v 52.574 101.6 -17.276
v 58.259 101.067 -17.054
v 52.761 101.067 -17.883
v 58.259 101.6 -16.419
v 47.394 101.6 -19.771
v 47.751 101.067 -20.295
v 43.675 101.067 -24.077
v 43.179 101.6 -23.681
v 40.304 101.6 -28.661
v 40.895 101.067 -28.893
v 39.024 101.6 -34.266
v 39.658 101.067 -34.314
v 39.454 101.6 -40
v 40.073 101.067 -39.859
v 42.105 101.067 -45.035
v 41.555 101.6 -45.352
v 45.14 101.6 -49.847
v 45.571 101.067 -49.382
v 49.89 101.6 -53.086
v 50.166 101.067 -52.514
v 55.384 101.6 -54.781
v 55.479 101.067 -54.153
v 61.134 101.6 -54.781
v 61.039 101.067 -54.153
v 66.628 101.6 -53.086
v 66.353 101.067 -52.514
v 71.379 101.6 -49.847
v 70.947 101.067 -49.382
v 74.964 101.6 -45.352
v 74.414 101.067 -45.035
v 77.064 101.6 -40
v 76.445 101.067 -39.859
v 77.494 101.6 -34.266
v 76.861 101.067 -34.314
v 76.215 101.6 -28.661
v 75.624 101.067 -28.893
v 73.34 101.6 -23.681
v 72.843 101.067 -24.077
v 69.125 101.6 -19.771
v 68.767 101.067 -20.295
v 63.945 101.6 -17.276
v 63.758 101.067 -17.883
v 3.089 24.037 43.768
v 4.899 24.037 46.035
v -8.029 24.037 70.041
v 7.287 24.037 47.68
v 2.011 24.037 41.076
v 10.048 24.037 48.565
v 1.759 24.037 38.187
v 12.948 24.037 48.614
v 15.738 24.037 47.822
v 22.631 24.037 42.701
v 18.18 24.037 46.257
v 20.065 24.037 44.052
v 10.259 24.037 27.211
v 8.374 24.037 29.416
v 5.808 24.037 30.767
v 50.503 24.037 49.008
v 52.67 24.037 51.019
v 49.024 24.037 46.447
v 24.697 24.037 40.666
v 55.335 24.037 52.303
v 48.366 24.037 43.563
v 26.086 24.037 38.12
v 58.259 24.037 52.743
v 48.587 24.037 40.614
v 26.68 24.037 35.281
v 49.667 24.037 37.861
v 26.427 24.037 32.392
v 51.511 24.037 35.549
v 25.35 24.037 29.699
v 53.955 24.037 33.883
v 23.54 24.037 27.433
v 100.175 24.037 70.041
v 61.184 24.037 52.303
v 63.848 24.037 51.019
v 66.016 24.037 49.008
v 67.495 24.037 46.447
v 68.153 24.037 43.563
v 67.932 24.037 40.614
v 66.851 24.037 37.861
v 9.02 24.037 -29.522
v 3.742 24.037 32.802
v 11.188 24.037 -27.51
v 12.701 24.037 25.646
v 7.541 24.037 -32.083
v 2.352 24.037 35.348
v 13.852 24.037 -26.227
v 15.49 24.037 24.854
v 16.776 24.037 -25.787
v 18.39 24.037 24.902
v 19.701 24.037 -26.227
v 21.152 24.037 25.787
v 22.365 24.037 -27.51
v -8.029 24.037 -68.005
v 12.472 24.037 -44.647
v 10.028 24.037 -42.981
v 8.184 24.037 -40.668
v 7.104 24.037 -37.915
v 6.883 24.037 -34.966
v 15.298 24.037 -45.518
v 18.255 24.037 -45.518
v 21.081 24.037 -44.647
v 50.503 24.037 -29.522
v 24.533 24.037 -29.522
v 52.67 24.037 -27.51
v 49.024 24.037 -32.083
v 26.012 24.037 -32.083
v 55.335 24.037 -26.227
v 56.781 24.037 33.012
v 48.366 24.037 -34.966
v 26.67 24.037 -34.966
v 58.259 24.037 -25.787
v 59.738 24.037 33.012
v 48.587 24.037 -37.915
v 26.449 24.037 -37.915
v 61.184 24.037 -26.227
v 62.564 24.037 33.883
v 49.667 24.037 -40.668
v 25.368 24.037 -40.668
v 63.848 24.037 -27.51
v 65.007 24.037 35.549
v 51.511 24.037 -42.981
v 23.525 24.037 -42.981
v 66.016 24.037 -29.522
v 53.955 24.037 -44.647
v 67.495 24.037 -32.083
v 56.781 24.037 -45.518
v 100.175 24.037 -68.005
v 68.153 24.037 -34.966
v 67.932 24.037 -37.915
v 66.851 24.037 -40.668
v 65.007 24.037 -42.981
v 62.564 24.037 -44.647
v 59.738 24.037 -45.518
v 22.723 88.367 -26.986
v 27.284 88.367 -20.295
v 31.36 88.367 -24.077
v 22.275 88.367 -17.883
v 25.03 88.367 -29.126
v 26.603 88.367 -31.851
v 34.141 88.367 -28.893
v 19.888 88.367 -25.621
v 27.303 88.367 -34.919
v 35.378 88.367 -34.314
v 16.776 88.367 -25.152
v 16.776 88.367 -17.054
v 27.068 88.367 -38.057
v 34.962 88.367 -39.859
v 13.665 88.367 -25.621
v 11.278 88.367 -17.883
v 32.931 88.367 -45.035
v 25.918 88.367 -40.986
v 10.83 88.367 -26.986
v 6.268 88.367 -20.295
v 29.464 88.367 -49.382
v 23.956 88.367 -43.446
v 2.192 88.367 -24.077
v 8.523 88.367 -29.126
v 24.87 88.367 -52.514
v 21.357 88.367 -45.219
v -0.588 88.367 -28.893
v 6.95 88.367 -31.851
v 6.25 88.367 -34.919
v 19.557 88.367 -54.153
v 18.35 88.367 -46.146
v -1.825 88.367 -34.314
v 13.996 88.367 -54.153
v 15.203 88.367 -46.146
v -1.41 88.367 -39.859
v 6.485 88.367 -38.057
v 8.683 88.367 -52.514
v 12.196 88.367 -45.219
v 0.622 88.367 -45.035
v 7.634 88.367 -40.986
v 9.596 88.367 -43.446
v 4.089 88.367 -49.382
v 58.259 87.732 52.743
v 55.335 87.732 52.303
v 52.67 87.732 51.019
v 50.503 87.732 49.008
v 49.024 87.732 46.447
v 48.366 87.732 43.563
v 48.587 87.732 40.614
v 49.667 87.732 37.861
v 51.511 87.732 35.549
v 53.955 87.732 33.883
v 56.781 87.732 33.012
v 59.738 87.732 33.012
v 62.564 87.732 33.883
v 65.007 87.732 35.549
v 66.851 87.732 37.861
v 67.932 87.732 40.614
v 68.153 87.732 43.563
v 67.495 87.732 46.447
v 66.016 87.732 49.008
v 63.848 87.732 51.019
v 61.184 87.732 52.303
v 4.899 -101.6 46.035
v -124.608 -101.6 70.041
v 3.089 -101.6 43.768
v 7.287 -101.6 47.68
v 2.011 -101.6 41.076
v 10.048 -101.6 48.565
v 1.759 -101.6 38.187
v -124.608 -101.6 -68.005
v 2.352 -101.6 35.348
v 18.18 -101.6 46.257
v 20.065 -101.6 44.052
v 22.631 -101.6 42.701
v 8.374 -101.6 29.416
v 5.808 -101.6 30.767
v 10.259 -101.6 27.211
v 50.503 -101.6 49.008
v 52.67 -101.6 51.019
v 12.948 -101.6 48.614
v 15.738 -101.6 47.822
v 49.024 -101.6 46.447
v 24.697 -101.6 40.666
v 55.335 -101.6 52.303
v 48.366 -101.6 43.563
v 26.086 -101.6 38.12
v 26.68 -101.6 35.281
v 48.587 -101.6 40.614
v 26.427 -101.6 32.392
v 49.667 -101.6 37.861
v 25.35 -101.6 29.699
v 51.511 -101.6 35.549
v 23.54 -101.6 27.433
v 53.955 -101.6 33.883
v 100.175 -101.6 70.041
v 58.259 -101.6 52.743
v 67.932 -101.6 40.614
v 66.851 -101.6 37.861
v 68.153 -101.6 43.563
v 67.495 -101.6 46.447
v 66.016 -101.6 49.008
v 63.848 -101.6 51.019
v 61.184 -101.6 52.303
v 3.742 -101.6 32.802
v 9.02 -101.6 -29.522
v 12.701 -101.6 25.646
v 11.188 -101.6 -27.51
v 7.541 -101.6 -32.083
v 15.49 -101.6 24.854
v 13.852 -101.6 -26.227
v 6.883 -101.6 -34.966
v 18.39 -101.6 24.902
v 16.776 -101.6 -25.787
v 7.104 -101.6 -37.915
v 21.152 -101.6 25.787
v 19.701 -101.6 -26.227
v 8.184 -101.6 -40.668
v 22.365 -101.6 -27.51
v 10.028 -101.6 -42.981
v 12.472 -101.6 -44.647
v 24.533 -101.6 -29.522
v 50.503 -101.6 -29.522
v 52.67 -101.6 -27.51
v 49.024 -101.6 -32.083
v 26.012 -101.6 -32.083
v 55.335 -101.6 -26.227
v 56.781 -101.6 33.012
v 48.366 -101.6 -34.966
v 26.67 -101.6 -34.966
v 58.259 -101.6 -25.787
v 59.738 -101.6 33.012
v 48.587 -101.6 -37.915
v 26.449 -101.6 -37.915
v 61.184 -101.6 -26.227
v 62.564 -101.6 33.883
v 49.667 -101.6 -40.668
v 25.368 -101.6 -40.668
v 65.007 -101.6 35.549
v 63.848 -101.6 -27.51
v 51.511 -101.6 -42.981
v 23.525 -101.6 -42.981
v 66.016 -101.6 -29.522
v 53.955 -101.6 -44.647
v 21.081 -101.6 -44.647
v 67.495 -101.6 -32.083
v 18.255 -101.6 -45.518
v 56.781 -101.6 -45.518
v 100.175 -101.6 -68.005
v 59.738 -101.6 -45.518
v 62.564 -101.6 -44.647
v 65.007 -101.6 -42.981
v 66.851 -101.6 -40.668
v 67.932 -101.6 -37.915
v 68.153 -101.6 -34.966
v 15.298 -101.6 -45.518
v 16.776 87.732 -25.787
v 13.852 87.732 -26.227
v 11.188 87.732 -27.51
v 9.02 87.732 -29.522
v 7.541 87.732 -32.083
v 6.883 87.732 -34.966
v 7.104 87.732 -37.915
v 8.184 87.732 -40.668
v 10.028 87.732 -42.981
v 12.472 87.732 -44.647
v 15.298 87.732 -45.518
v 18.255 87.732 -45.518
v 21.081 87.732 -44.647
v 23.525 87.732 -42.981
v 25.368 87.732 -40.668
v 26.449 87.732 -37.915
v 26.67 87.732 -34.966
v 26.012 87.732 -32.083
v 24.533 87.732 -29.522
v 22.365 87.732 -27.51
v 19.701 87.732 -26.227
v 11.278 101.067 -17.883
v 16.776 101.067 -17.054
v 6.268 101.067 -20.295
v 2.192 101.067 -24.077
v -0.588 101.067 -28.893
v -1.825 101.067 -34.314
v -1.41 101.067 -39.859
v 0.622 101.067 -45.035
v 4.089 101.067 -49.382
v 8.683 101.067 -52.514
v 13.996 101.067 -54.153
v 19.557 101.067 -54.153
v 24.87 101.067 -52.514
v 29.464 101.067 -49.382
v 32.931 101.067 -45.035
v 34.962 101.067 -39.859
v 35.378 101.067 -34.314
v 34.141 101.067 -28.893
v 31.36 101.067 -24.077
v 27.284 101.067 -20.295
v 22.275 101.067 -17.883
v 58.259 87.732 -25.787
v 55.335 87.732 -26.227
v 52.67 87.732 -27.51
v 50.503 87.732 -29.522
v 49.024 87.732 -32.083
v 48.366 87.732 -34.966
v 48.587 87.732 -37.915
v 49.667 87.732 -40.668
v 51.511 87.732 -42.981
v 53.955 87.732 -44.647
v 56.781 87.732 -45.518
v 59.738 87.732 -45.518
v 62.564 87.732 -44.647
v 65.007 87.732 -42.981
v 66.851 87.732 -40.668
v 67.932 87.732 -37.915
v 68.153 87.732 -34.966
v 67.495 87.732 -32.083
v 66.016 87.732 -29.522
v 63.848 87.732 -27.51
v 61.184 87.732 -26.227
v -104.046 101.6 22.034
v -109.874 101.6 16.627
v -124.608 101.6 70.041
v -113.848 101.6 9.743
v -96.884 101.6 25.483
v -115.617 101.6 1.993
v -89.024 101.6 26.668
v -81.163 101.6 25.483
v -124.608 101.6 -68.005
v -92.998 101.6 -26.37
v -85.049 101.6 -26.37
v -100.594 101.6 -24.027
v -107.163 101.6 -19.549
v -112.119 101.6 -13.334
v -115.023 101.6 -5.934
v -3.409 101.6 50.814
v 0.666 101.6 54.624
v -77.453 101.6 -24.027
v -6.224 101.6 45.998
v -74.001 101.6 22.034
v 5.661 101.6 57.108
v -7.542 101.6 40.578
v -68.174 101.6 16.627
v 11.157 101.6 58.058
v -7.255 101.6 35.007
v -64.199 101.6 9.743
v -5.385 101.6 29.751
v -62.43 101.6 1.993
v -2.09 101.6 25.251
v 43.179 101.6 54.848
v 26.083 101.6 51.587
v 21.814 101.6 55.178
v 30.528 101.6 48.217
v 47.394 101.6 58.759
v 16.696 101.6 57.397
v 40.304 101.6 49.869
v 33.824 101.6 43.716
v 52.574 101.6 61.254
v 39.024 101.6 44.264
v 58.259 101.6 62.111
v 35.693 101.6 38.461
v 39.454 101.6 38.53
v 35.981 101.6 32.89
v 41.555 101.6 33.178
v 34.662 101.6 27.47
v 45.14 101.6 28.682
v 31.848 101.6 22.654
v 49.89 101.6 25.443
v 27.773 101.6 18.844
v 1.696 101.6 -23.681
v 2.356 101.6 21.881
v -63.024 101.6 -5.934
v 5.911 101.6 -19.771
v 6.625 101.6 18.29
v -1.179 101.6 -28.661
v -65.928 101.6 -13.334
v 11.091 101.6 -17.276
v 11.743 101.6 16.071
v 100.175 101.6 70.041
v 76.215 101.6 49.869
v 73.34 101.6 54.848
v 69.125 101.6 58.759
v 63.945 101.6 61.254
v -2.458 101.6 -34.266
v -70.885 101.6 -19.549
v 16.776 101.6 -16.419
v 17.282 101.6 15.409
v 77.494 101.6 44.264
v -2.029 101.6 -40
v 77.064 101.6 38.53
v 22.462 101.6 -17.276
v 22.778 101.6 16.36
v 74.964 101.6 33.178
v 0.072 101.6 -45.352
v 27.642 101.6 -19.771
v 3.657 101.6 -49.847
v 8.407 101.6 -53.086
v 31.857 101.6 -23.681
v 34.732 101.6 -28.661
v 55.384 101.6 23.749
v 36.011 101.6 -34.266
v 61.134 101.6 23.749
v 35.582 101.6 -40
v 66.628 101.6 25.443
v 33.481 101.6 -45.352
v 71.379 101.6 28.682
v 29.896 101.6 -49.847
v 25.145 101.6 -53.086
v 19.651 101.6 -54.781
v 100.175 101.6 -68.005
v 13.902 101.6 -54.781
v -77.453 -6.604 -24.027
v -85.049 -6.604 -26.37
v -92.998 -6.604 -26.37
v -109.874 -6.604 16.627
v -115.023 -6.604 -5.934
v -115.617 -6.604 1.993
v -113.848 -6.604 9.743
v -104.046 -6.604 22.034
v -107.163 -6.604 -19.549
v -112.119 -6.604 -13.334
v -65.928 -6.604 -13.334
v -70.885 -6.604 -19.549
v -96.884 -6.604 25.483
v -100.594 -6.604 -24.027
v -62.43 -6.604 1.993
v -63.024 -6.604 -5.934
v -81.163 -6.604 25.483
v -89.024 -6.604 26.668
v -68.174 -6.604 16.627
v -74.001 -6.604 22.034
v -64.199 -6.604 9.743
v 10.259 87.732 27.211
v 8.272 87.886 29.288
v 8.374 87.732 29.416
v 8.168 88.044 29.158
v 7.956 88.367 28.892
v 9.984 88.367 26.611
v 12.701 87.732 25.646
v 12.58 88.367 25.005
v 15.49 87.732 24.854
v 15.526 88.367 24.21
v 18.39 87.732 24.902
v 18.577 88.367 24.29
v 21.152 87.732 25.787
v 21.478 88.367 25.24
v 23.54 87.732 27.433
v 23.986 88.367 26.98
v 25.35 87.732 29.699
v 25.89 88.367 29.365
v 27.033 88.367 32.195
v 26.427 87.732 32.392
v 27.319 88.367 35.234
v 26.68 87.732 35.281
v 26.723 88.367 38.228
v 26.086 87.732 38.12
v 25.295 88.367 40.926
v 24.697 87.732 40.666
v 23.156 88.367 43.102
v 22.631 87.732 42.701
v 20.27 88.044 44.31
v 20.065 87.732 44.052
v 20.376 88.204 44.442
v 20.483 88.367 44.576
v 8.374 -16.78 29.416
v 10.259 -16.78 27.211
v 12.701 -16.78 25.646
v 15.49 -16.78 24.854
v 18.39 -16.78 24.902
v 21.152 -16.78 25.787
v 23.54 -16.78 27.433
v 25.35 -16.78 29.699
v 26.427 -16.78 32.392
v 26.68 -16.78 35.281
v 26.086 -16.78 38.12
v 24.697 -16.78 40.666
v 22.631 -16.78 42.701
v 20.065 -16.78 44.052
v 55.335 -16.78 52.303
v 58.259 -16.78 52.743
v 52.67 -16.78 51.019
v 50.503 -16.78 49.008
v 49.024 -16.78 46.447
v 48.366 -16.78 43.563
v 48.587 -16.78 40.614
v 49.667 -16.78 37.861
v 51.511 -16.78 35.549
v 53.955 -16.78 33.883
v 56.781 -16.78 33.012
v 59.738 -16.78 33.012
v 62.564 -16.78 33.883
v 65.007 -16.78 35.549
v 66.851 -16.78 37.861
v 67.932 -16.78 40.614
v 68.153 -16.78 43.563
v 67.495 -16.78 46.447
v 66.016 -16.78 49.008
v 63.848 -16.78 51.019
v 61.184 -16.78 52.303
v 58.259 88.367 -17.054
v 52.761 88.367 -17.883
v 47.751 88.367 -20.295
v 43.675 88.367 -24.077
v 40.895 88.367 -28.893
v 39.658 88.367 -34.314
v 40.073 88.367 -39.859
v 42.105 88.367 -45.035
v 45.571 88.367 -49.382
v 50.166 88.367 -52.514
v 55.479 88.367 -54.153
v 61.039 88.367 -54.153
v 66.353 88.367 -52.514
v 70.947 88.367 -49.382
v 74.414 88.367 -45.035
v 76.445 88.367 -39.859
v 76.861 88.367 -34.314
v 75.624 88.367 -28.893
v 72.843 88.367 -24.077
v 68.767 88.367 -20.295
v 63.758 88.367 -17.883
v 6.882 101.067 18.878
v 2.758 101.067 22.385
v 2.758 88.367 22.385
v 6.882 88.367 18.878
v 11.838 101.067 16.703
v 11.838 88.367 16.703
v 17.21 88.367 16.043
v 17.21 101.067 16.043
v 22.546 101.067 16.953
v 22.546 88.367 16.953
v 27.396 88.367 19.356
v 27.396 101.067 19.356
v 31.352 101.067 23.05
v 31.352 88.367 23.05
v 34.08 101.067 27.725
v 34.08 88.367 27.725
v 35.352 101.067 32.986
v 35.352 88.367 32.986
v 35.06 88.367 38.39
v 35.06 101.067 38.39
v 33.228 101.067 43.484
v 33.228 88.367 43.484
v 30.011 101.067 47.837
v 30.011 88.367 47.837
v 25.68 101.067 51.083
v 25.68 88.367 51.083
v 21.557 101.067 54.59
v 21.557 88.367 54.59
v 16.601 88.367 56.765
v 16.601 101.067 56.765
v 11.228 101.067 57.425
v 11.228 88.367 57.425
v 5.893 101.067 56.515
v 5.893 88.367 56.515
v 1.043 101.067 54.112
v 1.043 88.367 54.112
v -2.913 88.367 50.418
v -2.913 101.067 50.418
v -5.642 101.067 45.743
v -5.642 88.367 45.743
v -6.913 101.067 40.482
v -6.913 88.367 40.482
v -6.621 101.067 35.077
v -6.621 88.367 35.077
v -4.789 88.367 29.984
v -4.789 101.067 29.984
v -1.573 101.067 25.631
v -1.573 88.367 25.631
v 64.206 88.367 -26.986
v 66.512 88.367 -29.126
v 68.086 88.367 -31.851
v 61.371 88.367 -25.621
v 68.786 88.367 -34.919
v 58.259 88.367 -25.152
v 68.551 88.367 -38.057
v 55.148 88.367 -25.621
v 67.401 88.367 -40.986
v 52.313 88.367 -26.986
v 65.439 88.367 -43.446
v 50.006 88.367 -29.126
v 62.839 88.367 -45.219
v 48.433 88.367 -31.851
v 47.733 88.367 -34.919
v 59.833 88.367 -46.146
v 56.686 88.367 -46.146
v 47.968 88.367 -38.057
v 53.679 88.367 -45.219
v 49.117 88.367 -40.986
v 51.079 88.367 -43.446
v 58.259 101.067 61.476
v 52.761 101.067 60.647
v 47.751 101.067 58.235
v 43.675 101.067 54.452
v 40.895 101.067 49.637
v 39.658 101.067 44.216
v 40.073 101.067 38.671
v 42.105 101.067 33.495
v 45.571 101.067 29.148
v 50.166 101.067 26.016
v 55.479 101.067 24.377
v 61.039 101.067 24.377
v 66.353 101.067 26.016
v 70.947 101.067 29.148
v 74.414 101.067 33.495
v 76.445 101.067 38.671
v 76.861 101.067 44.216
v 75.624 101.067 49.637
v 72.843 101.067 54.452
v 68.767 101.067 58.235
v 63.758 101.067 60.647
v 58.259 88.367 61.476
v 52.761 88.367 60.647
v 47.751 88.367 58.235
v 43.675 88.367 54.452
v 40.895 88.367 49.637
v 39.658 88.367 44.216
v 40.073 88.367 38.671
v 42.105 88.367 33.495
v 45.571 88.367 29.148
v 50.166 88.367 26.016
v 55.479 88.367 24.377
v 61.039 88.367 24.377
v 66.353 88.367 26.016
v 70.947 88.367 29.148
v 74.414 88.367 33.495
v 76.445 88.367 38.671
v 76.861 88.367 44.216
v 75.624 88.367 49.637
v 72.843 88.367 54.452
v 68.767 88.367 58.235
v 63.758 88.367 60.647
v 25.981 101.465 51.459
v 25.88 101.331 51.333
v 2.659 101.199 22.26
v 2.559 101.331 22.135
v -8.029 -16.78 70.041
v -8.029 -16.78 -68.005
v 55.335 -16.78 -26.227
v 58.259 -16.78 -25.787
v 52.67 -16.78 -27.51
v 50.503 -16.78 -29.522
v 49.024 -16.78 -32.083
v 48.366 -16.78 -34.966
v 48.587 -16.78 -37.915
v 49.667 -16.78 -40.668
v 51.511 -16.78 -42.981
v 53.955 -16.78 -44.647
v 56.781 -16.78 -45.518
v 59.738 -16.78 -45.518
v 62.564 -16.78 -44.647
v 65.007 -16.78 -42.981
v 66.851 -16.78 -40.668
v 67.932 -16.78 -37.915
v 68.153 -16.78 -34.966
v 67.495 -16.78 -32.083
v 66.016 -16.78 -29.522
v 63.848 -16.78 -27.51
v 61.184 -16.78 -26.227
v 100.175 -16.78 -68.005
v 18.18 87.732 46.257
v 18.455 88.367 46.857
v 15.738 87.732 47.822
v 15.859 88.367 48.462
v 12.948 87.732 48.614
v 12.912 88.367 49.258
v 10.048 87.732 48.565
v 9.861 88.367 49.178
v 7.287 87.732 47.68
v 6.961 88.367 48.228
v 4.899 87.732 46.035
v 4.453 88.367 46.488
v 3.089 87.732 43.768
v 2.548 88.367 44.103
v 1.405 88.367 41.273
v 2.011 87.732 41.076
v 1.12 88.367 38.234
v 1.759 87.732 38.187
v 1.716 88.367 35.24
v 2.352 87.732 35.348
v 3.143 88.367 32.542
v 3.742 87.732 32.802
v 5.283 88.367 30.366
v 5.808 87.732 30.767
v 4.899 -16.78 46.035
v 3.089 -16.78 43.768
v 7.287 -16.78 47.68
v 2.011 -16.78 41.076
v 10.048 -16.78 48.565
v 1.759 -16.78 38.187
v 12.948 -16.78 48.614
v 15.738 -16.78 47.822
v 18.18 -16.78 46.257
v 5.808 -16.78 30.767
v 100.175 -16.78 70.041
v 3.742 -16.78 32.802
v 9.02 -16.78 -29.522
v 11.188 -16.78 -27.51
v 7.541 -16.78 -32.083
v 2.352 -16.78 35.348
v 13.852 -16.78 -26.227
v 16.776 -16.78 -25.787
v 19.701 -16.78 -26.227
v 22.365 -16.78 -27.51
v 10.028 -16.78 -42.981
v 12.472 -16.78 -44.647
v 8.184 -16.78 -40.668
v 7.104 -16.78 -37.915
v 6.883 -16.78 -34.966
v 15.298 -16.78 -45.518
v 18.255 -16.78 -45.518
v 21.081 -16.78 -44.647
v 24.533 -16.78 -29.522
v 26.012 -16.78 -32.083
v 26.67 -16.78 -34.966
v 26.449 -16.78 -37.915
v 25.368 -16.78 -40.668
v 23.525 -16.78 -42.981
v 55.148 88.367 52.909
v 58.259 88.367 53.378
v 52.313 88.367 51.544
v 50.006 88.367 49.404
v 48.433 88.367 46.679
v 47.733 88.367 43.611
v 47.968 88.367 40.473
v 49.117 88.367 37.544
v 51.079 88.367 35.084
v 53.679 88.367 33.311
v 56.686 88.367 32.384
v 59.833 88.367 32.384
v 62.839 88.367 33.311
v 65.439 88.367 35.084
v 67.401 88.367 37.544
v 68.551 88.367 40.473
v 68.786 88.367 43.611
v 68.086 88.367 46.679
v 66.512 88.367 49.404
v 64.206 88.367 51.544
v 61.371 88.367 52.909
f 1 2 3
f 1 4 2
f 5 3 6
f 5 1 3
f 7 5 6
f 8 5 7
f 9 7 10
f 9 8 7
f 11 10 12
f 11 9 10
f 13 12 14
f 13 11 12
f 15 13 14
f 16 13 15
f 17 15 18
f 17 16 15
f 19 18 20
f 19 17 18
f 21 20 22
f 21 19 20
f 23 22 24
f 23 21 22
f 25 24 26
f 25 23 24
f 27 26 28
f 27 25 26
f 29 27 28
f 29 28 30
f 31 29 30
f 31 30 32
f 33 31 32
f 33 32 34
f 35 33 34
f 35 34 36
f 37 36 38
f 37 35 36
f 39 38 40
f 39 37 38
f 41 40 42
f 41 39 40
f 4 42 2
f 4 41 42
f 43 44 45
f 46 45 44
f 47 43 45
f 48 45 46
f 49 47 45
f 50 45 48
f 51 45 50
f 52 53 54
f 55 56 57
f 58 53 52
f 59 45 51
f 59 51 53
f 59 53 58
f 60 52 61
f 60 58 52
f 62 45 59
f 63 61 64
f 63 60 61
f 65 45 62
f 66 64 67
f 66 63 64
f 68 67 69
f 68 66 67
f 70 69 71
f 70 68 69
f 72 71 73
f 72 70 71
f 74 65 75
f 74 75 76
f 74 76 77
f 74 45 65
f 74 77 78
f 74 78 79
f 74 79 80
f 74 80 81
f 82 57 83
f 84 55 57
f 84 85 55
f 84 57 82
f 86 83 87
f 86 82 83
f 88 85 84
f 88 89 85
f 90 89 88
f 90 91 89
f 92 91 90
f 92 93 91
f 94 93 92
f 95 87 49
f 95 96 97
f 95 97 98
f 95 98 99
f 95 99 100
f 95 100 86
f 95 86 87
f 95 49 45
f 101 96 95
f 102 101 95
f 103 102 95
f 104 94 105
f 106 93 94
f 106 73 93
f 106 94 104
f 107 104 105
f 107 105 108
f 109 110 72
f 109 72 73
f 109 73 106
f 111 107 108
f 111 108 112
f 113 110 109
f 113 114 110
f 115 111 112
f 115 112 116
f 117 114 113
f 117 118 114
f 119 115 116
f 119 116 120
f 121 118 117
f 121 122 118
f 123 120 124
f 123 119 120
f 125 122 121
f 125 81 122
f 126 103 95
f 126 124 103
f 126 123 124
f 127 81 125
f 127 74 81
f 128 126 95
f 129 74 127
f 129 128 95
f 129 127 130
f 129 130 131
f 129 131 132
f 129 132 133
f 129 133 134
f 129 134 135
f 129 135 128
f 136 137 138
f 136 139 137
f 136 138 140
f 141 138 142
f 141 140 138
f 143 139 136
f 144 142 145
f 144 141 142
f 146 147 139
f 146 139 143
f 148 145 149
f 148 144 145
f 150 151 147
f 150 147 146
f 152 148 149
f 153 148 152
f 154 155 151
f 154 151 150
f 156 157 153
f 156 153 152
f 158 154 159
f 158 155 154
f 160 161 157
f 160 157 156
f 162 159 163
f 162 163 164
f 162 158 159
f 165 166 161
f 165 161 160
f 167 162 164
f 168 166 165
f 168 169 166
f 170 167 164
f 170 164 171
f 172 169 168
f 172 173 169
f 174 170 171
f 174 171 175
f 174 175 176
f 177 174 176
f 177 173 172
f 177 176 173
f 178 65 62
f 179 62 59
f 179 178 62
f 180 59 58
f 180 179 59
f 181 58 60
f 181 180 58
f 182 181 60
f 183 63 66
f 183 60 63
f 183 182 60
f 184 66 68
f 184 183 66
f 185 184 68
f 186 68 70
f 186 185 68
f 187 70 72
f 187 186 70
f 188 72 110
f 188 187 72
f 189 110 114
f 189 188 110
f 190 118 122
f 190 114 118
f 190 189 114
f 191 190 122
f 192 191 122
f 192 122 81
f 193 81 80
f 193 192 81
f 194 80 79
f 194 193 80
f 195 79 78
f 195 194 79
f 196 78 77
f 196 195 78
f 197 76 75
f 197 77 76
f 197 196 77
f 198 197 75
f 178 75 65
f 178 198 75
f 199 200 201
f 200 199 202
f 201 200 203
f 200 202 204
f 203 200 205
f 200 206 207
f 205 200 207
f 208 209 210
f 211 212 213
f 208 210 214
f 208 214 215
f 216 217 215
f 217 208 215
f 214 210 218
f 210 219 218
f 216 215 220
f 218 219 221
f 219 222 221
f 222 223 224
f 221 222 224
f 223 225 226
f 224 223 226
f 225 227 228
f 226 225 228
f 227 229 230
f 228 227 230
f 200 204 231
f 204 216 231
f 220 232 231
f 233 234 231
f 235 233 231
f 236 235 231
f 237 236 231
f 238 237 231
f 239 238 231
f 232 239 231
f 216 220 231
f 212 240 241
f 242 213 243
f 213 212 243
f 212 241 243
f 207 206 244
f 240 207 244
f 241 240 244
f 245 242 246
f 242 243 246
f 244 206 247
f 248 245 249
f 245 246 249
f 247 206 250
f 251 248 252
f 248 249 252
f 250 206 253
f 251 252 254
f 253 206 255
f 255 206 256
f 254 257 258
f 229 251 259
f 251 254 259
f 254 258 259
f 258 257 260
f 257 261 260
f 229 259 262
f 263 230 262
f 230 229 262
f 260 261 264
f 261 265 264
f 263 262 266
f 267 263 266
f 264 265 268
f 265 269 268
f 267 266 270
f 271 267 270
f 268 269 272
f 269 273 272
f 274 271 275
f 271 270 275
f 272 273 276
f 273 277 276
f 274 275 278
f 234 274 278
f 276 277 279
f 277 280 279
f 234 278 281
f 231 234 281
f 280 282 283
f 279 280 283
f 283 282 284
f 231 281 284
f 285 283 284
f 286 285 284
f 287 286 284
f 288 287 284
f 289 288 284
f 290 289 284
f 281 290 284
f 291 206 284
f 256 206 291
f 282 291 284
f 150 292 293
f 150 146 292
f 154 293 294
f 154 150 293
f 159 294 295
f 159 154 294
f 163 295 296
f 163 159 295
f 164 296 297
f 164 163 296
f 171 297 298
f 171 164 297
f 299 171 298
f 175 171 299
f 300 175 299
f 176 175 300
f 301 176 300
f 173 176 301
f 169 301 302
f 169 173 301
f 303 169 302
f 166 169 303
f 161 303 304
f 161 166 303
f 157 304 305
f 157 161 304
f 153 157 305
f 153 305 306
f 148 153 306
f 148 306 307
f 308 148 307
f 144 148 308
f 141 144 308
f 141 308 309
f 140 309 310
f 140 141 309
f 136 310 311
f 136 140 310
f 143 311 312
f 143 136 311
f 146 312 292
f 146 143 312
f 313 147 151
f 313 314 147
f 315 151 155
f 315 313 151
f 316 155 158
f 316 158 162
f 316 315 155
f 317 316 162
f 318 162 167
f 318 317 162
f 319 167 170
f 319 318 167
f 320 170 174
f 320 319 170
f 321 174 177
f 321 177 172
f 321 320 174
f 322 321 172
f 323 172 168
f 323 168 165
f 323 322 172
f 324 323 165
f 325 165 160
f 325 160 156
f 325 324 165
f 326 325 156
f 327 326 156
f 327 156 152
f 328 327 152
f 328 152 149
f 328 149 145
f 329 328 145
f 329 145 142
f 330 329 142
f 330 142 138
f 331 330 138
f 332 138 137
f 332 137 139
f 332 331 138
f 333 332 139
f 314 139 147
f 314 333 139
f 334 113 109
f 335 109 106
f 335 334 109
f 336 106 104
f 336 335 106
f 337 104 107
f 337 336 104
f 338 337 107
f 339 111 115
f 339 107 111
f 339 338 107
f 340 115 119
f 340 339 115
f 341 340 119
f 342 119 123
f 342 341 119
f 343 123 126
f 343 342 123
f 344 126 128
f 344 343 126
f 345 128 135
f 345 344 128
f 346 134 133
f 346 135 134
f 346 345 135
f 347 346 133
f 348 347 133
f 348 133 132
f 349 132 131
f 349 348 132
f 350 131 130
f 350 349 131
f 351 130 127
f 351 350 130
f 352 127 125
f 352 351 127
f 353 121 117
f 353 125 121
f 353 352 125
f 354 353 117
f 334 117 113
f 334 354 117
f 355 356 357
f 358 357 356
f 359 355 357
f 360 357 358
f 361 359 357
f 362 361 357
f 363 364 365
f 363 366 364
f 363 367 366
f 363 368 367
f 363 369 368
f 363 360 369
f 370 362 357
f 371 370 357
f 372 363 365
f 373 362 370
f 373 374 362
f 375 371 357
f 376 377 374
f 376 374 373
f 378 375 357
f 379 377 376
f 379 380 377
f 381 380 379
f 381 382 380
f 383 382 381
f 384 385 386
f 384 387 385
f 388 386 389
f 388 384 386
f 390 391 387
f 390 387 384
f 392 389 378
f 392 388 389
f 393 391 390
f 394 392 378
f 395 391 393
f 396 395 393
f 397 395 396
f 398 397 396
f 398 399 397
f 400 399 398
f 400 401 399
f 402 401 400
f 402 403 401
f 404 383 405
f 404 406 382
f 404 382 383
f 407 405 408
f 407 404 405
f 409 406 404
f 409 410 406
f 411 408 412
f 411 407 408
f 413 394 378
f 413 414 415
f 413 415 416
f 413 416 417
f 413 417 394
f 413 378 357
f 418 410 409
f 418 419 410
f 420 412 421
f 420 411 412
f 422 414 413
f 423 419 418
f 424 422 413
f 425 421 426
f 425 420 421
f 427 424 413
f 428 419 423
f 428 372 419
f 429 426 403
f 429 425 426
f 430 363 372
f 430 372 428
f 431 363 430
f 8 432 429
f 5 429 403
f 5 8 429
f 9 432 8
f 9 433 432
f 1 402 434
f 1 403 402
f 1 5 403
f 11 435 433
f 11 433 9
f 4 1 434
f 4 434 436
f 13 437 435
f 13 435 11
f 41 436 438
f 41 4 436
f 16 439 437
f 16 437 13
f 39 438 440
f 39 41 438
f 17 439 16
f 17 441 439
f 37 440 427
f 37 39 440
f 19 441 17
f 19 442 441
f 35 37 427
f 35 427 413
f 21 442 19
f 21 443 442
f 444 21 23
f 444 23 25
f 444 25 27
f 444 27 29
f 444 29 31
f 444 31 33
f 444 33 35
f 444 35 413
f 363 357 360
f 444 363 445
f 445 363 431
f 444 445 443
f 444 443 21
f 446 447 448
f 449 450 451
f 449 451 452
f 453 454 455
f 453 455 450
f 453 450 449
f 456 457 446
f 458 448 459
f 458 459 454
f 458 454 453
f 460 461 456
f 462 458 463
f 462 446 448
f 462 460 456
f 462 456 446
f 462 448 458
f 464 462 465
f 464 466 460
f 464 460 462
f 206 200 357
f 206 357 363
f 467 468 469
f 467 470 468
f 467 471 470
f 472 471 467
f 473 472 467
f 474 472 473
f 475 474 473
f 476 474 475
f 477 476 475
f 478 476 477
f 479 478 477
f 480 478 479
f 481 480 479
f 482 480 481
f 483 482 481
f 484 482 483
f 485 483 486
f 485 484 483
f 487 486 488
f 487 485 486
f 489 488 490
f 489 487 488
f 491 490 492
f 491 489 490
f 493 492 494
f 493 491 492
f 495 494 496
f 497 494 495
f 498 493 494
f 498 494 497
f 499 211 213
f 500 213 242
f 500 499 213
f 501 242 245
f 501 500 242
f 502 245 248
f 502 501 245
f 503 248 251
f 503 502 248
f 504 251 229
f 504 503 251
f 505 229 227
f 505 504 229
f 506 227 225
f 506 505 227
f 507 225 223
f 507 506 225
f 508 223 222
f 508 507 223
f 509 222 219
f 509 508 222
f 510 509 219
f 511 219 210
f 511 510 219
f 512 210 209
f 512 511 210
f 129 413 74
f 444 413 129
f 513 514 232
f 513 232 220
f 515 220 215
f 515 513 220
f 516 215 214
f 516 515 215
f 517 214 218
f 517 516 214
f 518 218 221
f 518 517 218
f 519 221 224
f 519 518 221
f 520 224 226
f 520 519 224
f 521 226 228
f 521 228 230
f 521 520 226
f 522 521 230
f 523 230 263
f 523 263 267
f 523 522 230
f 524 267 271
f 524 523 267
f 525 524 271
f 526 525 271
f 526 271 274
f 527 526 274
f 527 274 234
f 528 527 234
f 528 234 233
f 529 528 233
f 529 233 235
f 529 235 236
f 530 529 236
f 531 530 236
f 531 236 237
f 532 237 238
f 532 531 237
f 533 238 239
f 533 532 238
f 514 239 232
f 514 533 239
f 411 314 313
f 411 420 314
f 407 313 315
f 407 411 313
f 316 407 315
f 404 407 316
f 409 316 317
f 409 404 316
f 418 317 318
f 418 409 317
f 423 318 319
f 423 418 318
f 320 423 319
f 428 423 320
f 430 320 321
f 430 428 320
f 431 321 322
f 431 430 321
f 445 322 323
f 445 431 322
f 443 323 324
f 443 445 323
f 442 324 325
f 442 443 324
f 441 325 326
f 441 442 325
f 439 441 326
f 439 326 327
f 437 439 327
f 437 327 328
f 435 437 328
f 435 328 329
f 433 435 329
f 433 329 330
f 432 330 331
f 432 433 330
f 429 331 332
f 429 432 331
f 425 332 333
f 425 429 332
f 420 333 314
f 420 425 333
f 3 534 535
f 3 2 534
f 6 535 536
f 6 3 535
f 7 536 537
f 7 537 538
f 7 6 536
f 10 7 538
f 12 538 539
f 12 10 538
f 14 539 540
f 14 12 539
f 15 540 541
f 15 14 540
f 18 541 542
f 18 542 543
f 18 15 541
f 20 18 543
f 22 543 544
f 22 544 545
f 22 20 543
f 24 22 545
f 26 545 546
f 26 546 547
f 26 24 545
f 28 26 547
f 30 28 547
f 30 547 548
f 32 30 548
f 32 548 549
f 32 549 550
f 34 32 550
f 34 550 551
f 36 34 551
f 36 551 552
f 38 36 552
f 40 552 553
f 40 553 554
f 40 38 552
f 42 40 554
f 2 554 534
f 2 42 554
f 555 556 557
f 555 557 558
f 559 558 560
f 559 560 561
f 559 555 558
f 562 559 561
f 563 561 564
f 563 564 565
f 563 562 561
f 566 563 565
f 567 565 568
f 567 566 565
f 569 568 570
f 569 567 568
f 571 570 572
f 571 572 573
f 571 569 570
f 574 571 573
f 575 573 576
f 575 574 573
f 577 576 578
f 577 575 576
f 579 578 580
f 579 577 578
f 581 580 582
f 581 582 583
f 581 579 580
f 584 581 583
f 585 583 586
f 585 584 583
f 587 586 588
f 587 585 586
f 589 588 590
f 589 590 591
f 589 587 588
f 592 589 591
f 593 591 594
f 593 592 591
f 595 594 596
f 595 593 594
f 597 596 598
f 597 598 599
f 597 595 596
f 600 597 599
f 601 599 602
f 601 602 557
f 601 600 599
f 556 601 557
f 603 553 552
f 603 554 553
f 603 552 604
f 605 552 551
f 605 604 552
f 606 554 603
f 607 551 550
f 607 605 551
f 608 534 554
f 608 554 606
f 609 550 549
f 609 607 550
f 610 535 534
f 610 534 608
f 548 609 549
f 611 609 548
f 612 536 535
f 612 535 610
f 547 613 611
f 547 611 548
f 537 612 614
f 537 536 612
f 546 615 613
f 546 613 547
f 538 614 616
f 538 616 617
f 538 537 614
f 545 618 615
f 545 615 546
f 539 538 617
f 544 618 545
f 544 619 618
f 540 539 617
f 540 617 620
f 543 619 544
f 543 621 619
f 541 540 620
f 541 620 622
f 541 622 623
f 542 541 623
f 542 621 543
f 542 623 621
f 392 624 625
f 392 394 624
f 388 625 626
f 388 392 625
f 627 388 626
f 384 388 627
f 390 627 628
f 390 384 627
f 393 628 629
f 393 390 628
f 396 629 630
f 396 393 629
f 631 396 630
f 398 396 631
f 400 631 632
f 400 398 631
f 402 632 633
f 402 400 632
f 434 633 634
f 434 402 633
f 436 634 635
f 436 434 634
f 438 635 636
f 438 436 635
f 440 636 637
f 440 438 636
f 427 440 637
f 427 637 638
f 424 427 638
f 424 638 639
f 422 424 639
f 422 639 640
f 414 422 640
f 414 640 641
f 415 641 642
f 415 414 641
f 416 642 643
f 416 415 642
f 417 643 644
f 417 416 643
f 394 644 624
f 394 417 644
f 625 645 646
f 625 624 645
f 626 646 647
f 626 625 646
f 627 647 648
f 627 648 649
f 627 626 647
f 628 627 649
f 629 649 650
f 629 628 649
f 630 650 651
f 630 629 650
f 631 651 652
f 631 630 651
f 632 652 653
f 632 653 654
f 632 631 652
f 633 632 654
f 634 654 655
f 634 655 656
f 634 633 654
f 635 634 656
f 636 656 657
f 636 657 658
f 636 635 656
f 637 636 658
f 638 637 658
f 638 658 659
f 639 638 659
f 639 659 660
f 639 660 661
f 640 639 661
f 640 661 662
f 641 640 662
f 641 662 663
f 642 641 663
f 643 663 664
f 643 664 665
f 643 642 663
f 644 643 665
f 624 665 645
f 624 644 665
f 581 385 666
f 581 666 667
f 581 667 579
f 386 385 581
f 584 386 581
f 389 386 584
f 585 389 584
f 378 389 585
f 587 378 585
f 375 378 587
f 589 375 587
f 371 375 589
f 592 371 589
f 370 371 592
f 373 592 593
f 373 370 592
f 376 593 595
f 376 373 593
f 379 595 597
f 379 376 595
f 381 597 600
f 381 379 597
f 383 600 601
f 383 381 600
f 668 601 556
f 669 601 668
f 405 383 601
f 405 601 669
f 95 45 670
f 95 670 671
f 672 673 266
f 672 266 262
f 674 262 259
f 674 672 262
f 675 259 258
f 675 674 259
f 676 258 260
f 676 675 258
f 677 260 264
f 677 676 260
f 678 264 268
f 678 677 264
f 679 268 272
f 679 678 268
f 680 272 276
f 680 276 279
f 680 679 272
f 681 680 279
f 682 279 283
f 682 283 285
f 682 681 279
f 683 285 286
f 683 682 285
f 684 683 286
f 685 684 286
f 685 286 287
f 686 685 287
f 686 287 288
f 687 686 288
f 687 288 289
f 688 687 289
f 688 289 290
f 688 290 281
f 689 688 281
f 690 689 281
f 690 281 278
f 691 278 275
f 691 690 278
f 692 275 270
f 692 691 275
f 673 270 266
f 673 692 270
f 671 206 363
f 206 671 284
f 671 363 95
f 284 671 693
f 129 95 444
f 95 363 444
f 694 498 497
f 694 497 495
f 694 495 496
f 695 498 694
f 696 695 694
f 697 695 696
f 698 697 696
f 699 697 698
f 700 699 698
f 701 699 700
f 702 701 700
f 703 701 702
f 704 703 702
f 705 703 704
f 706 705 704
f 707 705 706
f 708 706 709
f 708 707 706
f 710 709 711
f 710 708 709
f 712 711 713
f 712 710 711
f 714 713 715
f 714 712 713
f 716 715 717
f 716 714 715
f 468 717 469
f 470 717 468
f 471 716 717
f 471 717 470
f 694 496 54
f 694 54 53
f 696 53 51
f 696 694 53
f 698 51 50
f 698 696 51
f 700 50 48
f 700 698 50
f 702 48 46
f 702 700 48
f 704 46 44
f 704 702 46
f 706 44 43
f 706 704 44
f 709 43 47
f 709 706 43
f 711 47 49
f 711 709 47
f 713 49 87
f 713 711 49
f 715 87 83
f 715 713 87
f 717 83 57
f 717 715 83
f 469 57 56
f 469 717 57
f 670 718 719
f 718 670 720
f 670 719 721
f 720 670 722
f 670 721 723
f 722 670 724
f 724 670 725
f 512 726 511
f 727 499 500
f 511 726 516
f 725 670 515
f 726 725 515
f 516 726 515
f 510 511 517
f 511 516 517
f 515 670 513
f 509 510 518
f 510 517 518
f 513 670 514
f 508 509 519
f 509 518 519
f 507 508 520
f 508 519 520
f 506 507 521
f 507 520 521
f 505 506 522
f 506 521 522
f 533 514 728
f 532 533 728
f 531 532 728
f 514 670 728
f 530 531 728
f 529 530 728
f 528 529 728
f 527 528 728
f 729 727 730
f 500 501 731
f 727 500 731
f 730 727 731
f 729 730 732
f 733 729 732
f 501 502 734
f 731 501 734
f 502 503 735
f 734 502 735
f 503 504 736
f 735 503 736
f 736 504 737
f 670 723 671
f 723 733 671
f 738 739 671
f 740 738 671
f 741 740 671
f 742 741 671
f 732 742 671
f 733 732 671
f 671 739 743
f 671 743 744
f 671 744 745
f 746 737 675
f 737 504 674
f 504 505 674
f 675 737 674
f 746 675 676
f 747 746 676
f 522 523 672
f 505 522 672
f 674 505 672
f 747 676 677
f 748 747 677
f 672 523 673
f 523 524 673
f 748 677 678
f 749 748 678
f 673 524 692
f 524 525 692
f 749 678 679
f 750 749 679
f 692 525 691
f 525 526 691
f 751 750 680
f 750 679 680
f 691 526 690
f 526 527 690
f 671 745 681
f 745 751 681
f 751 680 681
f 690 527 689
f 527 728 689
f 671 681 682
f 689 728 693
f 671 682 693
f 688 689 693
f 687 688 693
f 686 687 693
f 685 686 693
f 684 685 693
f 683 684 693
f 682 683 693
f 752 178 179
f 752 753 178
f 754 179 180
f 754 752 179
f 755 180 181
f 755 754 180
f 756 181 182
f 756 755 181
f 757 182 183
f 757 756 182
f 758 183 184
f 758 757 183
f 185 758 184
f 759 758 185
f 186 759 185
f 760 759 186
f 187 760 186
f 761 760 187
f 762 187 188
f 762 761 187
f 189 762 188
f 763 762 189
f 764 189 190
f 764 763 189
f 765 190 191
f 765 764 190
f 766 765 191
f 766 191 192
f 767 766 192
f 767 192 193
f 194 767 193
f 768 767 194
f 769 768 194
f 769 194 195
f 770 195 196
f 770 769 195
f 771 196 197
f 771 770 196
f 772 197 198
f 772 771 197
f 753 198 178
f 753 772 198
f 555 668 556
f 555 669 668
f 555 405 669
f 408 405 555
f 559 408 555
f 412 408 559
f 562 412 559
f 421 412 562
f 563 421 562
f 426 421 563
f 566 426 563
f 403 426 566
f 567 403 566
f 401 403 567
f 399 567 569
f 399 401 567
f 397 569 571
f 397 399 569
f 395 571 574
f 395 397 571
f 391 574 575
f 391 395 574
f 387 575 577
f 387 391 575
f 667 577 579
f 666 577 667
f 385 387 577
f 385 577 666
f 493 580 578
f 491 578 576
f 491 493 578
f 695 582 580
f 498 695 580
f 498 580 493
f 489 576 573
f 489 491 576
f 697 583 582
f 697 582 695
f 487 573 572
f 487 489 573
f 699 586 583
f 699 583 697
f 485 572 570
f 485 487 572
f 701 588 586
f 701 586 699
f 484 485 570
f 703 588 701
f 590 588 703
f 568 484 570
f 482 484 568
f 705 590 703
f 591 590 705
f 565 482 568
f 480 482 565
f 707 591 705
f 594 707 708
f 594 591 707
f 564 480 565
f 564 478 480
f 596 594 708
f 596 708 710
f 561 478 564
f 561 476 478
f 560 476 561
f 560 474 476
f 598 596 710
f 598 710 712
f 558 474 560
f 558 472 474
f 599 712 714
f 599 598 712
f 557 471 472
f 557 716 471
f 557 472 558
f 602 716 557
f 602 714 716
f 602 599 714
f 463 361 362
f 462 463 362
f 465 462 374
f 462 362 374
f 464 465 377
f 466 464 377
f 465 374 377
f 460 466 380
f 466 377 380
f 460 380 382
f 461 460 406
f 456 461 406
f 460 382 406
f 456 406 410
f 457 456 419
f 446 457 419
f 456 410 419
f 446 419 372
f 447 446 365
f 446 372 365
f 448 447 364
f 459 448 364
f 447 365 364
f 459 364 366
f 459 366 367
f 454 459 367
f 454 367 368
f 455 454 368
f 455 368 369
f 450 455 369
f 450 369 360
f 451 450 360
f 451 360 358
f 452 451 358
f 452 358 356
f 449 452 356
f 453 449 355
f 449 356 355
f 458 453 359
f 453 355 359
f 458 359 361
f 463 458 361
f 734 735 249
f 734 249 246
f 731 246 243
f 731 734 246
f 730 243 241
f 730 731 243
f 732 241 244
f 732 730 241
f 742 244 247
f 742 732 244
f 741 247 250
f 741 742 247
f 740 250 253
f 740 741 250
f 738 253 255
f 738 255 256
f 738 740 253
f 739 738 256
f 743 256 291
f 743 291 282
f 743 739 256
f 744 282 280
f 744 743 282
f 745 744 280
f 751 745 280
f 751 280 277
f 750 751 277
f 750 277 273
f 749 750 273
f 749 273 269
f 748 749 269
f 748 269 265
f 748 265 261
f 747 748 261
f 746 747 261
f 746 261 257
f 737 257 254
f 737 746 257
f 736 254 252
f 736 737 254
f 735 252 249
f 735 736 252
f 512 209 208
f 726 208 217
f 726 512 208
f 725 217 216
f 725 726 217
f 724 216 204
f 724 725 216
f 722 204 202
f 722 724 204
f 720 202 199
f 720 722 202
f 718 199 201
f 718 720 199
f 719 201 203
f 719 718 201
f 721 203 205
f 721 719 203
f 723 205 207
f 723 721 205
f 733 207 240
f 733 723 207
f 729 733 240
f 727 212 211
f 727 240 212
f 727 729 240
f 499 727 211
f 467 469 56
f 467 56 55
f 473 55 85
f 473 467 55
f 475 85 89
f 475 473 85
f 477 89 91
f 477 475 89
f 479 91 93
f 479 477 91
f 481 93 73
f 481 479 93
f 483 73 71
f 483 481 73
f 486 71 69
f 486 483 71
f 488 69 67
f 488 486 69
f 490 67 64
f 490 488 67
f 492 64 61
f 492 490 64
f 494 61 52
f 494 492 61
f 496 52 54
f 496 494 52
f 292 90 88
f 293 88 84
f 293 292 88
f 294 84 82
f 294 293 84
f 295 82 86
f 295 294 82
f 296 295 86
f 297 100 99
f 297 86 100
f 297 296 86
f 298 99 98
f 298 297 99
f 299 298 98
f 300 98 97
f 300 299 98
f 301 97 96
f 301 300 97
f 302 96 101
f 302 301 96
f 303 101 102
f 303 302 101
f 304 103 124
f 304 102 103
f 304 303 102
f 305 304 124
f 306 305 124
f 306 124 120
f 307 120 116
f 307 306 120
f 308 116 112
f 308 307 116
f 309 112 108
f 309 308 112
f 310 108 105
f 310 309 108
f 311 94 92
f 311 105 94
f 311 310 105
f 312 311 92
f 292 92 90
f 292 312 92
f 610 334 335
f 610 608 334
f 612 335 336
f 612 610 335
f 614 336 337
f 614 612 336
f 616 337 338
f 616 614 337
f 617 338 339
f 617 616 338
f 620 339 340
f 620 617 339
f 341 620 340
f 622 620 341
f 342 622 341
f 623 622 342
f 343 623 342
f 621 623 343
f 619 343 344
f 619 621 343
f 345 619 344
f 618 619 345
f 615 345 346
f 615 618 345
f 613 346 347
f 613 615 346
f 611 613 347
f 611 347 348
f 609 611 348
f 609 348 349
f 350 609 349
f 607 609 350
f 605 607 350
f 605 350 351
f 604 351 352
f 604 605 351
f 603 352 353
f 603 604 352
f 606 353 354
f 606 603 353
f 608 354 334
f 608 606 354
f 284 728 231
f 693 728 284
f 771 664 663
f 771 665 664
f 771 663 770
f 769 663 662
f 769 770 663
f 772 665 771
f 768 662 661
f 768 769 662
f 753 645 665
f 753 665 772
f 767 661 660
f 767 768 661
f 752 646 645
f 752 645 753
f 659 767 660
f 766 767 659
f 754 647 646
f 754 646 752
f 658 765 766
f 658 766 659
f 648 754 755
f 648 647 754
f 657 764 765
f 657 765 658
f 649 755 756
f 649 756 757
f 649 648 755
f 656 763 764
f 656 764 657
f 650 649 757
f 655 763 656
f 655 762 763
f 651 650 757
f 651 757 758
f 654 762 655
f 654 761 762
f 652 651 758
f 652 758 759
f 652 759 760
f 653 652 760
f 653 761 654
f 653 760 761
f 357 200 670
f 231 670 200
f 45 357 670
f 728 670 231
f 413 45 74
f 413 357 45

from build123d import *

# Parameters (mm, degrees)
SKETCH1_W                                      = 224.783024271
SKETCH1_H                                      = 138.046096427
BOSS_EXTRUDE1_DEPTH                            = 101.6
SKETCH2_R                                      = 26.66819347
CUT_EXTRUDE1_DEPTH                             = 108.204
SKETCH4_W                                      = 138.046096427
SKETCH4_H                                      = 40.817377809
CUT_EXTRUDE2_DEPTH                             = 108.204
CBORE_FOR_3_4_PAN_HEAD_MACHINE_SCREW1_AT_COUNT = 2
CBORE_FOR_3_4_PAN_HEAD_MACHINE_SCREW1_AT_PITCH = 78.529858642
CBORE_FOR_3_4_PAN_HEAD_MACHINE_SCREW_2_COUNT   = 2
CBORE_FOR_3_4_PAN_HEAD_MACHINE_SCREW_2_PITCH   = 88.813103961
CBORE_FOR_3_4_PAN_HEAD_MACHINE_SCREW_3_COUNT   = 2
CBORE_FOR_3_4_PAN_HEAD_MACHINE_SCREW_3_PITCH   = 46.772278414
CBORE_FOR_3_4_PAN_HEAD_MACHINE_SCREW_4_COUNT   = 2
CBORE_FOR_3_4_PAN_HEAD_MACHINE_SCREW_4_PITCH   = 42.272131605


with BuildPart() as part:
    # Sketch1 → Boss-Extrude1 (new, symmetric)
    with BuildSketch(Plane(origin=(0, 0, 0), x_dir=(1, 0, 0), z_dir=(0, 1, 0))):
        with Locations((-12.21646871, -1.018039059)):
            Rectangle(SKETCH1_W, SKETCH1_H)
    extrude(amount=BOSS_EXTRUDE1_DEPTH, both=True)

    # Sketch2 → Cut-Extrude1 (cut)
    with BuildSketch(Plane(origin=(0, 101.6, 0), x_dir=(1, 0, 0), z_dir=(0, 1, 0))):
        with Locations(Location((-89.023589675, 0, 0), (0, 0, 270))):
            Circle(SKETCH2_R)
    extrude(amount=-CUT_EXTRUDE1_DEPTH, mode=Mode.SUBTRACT)

    # Sketch4 → Cut-Extrude2 (cut)
    with BuildSketch(Plane(origin=(100.175043425, 0, 0), x_dir=(0, 0, -1), z_dir=(1, 0, 0))):
        with Locations((-1.018039059, 3.62821136)):
            Rectangle(SKETCH4_W, SKETCH4_H)
    extrude(amount=-CUT_EXTRUDE2_DEPTH, mode=Mode.SUBTRACT)

    # Sketch7 → CBORE for 3/4 Pan Head Machine Screw1 (revolve, cut)
    with BuildSketch(Plane(origin=(58.259270804, 101.6, 42.822055049), x_dir=(0, 0, 1), z_dir=(1, 0, 0))):
        Polygon((0, 0), (0, 203.2), (9.92124, 203.2), (9.92124, 13.8684), (10.55624, 13.2334), (18.65376, 13.2334), (18.65376, 0.532828266), (19.28876, 0), align=None)
    cbore_for_3_4_pan_head_machine_screw1 = revolve(axis=Axis((58.259270804, 107.95, 42.822055049), (0, -1, 0)), mode=Mode.SUBTRACT)

    # CBORE for 3/4 Pan Head Machine Screw1 at: CBORE for 3/4 Pan Head Machine Screw1 ×2
    with Locations(*[(0, 0, -i * CBORE_FOR_3_4_PAN_HEAD_MACHINE_SCREW1_AT_PITCH) for i in range(1, CBORE_FOR_3_4_PAN_HEAD_MACHINE_SCREW1_AT_COUNT)]):
        add(cbore_for_3_4_pan_head_machine_screw1, mode=Mode.SUBTRACT)

    # CBORE for 3_4 Pan Head Machine Screw 2: CBORE for 3/4 Pan Head Machine Screw1 ×2
    with Locations(*[Vector(-0.46708054288373707, 0, -0.8842147739432052) * (i * CBORE_FOR_3_4_PAN_HEAD_MACHINE_SCREW_2_PITCH) for i in range(1, CBORE_FOR_3_4_PAN_HEAD_MACHINE_SCREW_2_COUNT)]):
        add(cbore_for_3_4_pan_head_machine_screw1, mode=Mode.SUBTRACT)

    # CBORE for 3_4 Pan Head Machine Screw 3: CBORE for 3/4 Pan Head Machine Screw1 ×2
    with Locations(*[Vector(-0.9962520130083015, 0, -0.08649813048215103) * (i * CBORE_FOR_3_4_PAN_HEAD_MACHINE_SCREW_3_PITCH) for i in range(1, CBORE_FOR_3_4_PAN_HEAD_MACHINE_SCREW_3_COUNT)]):
        add(cbore_for_3_4_pan_head_machine_screw1, mode=Mode.SUBTRACT)

    # CBORE for 3_4 Pan Head Machine Screw 4: CBORE for 3/4 Pan Head Machine Screw1 ×2
    with Locations(*[Vector(-0.9813290988359743, 0, -0.19233616346848256) * (i * CBORE_FOR_3_4_PAN_HEAD_MACHINE_SCREW_4_PITCH) for i in range(1, CBORE_FOR_3_4_PAN_HEAD_MACHINE_SCREW_4_COUNT)]):
        add(cbore_for_3_4_pan_head_machine_screw1, mode=Mode.SUBTRACT)


solid = part.part
